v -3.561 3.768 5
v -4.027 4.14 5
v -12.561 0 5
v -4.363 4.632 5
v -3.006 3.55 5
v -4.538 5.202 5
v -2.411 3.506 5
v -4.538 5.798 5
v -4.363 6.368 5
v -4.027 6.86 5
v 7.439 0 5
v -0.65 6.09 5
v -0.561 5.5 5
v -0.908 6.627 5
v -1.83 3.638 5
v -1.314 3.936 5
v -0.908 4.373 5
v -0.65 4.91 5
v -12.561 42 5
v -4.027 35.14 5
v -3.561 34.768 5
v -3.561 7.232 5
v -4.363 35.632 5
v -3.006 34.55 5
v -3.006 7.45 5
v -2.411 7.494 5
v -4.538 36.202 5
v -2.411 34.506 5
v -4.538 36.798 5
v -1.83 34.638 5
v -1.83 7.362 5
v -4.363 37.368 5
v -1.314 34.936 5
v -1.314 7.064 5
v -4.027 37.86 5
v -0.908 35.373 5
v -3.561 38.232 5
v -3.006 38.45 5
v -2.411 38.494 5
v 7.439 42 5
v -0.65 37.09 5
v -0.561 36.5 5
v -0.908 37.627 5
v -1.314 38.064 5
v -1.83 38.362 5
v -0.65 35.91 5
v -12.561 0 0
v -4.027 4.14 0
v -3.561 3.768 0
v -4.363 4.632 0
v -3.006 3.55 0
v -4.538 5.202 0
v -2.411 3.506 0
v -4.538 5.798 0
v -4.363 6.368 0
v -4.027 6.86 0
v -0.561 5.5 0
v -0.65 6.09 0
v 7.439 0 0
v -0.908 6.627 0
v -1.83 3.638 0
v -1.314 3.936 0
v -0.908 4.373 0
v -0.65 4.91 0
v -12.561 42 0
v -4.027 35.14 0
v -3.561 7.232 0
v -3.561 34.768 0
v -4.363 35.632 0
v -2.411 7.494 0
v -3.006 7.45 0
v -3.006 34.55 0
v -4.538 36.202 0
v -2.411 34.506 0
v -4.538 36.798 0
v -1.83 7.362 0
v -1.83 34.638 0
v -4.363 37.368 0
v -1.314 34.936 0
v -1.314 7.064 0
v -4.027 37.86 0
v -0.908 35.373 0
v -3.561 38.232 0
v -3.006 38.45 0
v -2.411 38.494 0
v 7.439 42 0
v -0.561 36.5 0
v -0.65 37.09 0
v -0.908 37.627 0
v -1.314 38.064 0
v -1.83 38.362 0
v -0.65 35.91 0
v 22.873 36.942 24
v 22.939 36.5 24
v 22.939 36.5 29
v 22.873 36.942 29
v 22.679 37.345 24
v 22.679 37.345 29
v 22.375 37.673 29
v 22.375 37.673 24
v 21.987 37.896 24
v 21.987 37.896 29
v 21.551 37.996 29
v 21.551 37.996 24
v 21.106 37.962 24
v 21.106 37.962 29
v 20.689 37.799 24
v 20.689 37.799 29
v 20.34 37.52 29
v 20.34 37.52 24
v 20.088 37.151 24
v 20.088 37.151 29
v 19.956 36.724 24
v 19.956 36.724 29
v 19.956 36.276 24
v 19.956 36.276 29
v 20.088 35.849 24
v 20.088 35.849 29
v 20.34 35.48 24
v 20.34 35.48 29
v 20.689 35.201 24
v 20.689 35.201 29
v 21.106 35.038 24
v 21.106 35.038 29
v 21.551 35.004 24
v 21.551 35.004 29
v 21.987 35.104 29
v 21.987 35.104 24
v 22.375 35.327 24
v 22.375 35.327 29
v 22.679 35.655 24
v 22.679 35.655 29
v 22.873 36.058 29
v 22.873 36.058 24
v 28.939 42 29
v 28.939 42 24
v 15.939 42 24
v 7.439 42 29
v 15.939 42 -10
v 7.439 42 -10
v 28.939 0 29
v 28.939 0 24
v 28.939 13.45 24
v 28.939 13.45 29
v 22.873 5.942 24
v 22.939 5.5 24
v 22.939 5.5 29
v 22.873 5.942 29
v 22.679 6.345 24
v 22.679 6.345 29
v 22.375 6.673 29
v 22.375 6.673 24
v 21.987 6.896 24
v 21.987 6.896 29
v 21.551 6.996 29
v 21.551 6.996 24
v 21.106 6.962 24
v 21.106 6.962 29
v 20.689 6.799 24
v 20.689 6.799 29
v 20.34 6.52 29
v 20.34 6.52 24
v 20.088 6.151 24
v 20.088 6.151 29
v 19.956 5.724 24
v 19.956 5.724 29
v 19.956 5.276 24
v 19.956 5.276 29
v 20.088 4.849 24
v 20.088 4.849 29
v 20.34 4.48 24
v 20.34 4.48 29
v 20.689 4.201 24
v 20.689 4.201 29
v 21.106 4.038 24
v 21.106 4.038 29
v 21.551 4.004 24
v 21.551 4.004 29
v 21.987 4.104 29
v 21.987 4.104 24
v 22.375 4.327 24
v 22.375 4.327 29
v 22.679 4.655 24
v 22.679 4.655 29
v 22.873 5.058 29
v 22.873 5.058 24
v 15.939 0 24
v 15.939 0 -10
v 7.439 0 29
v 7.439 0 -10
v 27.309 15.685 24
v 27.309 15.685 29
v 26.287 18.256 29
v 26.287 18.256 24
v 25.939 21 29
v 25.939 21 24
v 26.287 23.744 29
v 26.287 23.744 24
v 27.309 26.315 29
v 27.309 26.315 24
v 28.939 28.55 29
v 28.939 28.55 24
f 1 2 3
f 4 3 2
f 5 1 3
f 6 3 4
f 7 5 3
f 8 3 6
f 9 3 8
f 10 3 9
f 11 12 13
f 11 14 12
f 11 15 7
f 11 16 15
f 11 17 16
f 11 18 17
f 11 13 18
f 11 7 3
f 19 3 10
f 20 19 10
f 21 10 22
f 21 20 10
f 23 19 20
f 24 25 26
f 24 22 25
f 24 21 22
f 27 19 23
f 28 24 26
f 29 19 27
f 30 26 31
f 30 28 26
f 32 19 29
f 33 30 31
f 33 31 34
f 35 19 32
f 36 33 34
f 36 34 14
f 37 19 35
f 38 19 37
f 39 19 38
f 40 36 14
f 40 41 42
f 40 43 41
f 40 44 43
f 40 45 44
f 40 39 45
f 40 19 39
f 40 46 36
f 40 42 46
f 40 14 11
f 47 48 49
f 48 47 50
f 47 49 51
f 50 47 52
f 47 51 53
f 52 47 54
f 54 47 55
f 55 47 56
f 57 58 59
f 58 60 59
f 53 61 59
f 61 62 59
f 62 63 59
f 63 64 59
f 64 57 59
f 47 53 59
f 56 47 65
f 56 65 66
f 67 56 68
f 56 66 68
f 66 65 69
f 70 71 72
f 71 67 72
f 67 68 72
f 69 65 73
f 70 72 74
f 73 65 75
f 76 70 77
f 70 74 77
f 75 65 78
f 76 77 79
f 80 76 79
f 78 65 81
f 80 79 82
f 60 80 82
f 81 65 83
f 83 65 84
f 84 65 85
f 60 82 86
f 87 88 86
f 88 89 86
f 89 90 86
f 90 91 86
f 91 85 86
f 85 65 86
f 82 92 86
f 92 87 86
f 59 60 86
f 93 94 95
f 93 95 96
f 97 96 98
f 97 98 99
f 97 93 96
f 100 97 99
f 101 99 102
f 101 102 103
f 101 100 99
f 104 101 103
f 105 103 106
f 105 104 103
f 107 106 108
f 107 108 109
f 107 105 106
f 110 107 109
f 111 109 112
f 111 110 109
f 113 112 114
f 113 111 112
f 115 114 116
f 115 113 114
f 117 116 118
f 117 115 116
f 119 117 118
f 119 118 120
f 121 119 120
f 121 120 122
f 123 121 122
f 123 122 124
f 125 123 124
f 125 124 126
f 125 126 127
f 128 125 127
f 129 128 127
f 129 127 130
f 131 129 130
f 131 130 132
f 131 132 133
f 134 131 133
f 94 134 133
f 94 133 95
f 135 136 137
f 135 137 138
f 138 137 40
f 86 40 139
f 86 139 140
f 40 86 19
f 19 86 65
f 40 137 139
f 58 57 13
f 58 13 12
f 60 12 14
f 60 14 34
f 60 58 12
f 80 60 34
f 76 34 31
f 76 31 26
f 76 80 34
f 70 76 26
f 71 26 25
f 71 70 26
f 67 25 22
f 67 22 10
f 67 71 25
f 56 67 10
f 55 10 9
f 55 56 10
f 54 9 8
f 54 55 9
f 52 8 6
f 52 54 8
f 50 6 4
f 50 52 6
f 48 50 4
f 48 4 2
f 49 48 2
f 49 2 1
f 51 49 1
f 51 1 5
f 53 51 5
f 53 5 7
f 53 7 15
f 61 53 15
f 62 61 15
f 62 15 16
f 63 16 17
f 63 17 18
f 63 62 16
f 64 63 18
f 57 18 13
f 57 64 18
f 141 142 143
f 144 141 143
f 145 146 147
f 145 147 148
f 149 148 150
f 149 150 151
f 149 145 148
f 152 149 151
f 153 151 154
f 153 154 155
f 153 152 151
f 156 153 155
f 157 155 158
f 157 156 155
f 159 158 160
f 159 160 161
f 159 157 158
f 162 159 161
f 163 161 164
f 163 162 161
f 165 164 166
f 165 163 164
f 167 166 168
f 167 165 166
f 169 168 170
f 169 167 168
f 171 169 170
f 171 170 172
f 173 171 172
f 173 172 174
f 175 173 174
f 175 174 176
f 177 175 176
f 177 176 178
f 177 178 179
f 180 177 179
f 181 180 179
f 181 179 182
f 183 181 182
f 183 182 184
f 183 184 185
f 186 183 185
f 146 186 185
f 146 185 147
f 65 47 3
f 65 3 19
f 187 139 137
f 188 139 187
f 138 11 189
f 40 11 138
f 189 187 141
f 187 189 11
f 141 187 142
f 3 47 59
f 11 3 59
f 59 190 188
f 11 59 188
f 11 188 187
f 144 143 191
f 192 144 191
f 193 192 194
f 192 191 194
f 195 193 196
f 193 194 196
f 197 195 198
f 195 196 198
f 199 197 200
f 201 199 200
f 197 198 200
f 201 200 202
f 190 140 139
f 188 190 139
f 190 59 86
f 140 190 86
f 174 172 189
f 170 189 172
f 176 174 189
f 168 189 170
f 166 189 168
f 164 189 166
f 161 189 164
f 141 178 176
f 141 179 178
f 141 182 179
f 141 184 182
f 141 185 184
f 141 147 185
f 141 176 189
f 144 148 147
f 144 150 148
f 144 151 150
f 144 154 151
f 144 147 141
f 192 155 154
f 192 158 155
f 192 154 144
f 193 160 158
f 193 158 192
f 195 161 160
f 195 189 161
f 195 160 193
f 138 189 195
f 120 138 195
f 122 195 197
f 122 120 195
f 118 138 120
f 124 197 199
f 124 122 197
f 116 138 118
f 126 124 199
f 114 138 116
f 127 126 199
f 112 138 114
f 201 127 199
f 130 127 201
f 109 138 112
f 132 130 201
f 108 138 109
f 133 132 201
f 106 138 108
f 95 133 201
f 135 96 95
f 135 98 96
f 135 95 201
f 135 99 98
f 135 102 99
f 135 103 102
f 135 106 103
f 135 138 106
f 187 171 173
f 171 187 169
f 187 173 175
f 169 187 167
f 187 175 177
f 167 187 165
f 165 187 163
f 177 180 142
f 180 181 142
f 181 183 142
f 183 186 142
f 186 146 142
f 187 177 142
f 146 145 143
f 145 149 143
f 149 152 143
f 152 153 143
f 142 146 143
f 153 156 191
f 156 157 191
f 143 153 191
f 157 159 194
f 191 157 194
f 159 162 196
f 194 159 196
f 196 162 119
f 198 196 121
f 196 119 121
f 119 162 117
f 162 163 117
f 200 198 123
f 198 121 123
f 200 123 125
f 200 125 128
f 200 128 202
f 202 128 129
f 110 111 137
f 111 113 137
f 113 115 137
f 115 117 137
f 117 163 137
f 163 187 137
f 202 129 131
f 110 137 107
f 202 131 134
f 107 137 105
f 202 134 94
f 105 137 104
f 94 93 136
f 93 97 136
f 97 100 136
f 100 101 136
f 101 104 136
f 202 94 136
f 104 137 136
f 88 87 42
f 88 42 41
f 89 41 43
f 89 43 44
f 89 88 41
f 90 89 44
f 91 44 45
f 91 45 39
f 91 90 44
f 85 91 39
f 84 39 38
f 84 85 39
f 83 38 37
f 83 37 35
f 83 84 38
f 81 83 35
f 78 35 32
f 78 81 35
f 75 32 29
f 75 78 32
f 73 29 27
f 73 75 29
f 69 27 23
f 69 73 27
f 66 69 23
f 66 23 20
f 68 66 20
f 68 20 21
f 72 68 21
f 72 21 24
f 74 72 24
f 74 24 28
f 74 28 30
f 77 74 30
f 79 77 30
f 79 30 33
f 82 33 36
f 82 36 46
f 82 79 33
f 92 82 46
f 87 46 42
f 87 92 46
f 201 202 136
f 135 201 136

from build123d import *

# Parameters (mm, degrees)
F0_W          = 20
F0_H          = 42
F0_R          = 2
F1_DEPTH      = 5
F0_W_2        = 8.5
F2_DEPTH      = 29
F2_DEPTH_BACK = 10
F0_R_2        = 1.5
F3_DEPTH      = 29
F4_DEPTH      = 24


# Not quite as in the source:
# - a feature names something its author has since deleted; it is built from what else it names


with BuildPart() as f1:
    # F0 (on Top) → F1 (new body)
    with BuildSketch(Plane.XY):
        with Locations((-2.5607131049, 21)):
            Rectangle(F0_W, F0_H)
        with Locations((-2.5607131049, 5.5)):
            Circle(F0_R, mode=Mode.SUBTRACT)
        with Locations((-2.5607131049, 36.5)):
            Circle(F0_R, mode=Mode.SUBTRACT)
    extrude(amount=F1_DEPTH)

    # F0 (on Top) → F2 (join, two sides)
    with BuildSketch(Plane.XY) as f2_sk:
        with Locations((11.6892868951, 21)):
            Rectangle(F0_W_2, F0_H)
    extrude(amount=F2_DEPTH)
    extrude(f2_sk.sketch, amount=-F2_DEPTH_BACK)

    # F0 (on Top) → F3 (join)
    with BuildSketch(Plane.XY):
        with BuildLine():
            ThreePointArc((28.9392868951, 13.4501655647), (25.9392868951, 21), (28.9392868951, 28.5498344353))
            Line((28.9392868951, 28.5498344353), (28.9392868951, 42))
            Line((28.9392868951, 42), (15.9392868951, 42))
            Line((15.9392868951, 42), (15.9392868951, 0))
            Line((15.9392868951, 0), (28.9392868951, 0))
            Line((28.9392868951, 0), (28.9392868951, 13.4501655647))
        make_face()
        with Locations((21.4392868951, 5.5)):
            Circle(F0_R_2, mode=Mode.SUBTRACT)
        with Locations((21.4392868951, 36.5)):
            Circle(F0_R_2, mode=Mode.SUBTRACT)
    extrude(amount=F3_DEPTH)

    # F0 (on Top) → F4 (cut)
    with BuildSketch(Plane.XY):
        with BuildLine():
            ThreePointArc((28.9392868951, 13.4501655647), (25.9392868951, 21), (28.9392868951, 28.5498344353))
            Line((28.9392868951, 28.5498344353), (28.9392868951, 42))
            Line((28.9392868951, 42), (15.9392868951, 42))
            Line((15.9392868951, 42), (15.9392868951, 0))
            Line((15.9392868951, 0), (28.9392868951, 0))
            Line((28.9392868951, 0), (28.9392868951, 13.4501655647))
        make_face()
        with Locations((21.4392868951, 5.5)):
            Circle(F0_R_2, mode=Mode.SUBTRACT)
        with Locations((21.4392868951, 36.5)):
            Circle(F0_R_2, mode=Mode.SUBTRACT)
    extrude(amount=F4_DEPTH, mode=Mode.SUBTRACT)


solid = f1.part
